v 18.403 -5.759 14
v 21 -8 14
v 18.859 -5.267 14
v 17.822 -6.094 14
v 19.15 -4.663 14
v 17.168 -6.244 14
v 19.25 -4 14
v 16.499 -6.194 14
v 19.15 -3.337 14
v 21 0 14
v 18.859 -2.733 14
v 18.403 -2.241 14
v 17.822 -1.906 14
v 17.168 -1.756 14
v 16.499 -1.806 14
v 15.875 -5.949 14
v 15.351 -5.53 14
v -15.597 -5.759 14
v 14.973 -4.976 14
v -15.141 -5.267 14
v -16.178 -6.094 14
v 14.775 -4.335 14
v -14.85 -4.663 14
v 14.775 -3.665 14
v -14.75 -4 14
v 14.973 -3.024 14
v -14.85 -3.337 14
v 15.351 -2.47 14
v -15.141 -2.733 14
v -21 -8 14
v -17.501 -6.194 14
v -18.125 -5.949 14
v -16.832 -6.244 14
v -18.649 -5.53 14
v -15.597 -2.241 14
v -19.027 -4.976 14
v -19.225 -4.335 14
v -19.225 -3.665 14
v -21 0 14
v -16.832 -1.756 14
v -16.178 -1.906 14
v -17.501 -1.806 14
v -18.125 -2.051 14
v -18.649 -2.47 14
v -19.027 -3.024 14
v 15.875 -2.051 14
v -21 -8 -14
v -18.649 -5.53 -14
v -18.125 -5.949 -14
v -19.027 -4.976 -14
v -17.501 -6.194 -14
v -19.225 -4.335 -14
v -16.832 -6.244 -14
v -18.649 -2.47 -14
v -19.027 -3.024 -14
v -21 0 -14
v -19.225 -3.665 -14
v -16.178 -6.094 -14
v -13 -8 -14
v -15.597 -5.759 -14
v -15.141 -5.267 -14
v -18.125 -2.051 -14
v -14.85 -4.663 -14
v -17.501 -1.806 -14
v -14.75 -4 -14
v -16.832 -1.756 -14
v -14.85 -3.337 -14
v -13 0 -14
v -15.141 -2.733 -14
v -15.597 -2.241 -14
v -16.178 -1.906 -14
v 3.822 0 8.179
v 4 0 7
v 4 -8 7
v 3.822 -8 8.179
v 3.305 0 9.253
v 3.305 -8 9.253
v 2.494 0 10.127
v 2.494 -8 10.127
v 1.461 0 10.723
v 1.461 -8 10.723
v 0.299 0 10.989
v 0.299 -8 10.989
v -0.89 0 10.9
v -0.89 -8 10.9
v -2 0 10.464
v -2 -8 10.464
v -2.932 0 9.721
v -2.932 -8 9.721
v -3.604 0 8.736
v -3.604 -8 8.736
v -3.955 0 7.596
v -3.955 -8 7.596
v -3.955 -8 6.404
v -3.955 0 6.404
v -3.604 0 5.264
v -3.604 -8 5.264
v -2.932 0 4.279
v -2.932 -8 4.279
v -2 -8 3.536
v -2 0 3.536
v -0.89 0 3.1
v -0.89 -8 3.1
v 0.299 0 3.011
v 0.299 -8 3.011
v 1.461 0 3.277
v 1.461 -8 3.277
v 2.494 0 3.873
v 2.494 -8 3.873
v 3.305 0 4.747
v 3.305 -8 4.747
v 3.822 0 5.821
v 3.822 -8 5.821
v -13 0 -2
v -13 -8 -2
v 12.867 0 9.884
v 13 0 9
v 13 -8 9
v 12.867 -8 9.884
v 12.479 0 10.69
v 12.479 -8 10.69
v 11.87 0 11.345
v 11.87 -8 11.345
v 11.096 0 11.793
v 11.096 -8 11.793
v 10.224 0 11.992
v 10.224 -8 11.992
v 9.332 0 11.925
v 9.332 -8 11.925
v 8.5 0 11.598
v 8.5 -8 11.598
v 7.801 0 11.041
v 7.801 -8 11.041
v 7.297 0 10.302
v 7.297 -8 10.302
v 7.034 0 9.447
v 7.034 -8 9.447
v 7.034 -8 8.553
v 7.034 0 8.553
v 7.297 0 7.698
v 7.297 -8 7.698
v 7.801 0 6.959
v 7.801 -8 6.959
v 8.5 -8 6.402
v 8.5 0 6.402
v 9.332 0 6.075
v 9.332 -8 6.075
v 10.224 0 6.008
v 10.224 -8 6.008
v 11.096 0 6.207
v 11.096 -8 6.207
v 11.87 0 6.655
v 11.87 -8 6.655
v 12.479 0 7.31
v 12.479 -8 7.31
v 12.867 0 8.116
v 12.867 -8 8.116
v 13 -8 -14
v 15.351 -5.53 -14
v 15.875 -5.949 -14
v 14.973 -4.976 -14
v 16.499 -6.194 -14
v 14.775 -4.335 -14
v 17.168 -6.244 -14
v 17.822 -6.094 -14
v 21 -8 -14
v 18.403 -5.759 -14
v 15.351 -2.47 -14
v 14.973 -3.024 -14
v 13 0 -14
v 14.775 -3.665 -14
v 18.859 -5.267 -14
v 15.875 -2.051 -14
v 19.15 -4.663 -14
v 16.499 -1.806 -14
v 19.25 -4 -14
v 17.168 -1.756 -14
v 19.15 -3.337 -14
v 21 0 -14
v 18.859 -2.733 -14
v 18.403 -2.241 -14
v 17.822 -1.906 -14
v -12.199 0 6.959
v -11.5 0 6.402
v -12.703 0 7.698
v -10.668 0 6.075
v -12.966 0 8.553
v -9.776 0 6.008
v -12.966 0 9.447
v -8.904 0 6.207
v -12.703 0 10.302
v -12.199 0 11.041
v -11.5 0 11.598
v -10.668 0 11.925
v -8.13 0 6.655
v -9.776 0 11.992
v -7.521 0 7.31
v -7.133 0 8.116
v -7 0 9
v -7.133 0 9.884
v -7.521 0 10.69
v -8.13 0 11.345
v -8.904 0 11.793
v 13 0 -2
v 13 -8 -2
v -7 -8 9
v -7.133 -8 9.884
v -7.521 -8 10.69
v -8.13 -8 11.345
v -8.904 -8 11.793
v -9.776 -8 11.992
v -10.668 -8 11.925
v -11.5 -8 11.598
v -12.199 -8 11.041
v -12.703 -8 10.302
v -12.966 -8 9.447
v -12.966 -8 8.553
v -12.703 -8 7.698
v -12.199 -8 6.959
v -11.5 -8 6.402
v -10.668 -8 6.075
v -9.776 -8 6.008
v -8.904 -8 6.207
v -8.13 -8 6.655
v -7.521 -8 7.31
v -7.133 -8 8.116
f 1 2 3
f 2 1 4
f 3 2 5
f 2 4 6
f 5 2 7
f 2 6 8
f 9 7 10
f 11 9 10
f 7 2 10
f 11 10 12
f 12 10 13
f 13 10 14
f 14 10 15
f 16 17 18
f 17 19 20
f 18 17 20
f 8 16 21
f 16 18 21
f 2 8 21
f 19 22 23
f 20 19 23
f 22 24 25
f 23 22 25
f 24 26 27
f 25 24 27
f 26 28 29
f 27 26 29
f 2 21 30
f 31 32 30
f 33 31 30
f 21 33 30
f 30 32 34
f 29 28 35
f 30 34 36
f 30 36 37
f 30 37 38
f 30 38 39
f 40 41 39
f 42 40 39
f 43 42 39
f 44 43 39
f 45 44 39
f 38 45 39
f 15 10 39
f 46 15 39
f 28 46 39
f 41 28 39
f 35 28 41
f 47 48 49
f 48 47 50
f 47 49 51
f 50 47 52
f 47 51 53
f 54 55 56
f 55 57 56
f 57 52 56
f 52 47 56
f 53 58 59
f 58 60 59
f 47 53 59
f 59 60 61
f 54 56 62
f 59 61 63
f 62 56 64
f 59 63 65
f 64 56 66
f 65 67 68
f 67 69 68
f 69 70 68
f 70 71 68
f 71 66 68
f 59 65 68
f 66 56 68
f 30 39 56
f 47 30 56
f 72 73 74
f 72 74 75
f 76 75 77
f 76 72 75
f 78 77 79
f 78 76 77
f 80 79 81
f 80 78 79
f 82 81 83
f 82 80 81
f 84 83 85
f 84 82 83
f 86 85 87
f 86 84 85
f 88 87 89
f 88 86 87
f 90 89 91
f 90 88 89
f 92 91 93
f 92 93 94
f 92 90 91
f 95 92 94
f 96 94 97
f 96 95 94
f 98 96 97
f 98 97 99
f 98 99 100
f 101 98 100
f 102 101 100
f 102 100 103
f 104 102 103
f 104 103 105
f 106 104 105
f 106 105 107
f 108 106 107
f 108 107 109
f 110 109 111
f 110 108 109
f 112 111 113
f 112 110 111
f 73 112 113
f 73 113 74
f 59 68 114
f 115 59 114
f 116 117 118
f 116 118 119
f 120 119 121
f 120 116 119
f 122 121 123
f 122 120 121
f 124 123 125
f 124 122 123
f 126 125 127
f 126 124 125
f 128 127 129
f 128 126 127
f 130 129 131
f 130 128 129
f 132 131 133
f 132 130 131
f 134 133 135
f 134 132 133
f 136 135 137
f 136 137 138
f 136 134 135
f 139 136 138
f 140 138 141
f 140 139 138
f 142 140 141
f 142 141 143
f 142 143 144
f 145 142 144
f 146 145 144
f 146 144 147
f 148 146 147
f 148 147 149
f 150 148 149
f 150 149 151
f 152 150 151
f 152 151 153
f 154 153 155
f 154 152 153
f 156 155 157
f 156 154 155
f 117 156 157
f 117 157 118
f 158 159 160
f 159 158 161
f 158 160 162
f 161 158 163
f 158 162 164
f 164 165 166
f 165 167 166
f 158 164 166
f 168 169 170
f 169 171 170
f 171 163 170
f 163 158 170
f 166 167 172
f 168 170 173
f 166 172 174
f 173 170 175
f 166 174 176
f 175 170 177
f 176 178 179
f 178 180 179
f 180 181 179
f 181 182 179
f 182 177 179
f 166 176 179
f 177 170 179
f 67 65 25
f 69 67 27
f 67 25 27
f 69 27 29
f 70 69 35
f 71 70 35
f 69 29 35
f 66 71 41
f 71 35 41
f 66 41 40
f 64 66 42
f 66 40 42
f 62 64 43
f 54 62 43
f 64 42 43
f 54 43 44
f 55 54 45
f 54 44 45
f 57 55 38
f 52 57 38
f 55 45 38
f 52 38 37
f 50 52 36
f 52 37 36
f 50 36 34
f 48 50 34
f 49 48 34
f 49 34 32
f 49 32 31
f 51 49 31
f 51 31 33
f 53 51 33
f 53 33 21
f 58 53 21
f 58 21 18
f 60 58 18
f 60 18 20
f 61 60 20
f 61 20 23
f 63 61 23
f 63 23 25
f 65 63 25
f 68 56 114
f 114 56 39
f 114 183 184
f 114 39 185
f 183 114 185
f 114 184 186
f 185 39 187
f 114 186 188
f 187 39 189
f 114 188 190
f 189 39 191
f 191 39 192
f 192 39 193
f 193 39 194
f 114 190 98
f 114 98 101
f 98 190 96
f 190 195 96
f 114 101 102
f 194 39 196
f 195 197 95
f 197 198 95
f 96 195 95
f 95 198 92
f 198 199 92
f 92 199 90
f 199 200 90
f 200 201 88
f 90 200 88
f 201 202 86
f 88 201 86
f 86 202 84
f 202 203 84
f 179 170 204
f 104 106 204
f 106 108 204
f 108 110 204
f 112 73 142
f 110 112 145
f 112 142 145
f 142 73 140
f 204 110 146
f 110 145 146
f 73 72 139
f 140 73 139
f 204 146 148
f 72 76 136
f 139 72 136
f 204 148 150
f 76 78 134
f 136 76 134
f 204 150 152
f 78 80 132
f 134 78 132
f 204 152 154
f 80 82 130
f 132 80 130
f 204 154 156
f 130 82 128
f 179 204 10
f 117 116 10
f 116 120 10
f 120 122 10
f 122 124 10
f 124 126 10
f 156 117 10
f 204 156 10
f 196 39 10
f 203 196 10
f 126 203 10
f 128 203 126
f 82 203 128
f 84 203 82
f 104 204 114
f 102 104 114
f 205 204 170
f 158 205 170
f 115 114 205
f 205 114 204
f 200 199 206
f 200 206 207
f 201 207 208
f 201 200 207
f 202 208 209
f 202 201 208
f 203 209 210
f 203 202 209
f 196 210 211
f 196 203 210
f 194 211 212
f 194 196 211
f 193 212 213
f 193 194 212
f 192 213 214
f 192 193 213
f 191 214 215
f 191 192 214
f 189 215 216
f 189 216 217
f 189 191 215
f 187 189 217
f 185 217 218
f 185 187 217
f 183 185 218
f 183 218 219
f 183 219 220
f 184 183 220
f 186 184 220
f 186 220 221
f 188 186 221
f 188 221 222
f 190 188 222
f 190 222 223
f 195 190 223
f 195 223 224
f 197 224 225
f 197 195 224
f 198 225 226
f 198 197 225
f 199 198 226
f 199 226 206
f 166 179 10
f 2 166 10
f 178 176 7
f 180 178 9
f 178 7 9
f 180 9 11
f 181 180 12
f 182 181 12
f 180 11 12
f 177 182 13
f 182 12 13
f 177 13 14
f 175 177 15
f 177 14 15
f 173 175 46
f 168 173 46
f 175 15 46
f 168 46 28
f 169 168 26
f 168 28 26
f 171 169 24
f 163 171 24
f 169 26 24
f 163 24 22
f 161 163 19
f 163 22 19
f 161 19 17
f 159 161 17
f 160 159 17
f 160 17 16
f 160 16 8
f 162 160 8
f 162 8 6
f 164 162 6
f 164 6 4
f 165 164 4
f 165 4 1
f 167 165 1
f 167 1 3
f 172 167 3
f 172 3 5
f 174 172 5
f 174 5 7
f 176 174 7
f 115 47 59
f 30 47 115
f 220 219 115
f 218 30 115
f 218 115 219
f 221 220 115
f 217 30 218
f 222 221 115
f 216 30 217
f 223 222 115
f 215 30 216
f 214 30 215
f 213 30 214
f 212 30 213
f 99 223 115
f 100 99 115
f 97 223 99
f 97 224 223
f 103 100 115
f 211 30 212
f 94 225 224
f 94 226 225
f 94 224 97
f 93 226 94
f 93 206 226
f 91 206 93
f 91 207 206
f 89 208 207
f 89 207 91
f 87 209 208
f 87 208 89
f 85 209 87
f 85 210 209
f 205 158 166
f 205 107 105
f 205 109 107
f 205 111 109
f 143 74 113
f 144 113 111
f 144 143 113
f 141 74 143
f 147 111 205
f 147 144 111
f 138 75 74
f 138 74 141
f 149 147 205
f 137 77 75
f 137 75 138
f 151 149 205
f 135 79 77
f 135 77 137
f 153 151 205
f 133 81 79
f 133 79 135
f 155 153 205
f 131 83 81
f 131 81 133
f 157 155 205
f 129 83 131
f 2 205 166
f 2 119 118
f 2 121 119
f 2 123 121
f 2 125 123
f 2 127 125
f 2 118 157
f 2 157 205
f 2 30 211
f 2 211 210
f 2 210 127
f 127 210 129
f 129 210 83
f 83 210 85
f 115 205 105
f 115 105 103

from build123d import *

# Parameters (mm, degrees)
F0_R     = 3
F0_R_2   = 4
F1_DEPTH = 8
F2_R     = 2.25
F3_DEPTH = 28.001


with BuildPart() as f1:
    # F0 (on Front) → F1 (new body)
    with BuildSketch(Plane.XZ):
        Polygon((21, 14), (-21, 14), (-21, -14), (-13, -14), (-13, -2), (13, -2), (13, -14), (21, -14), align=None)
        with Locations((-10, 9)):
            Circle(F0_R, mode=Mode.SUBTRACT)
        with Locations((0, 7)):
            Circle(F0_R_2, mode=Mode.SUBTRACT)
        with Locations((10, 9)):
            Circle(F0_R, mode=Mode.SUBTRACT)
    extrude(amount=F1_DEPTH)

    # F2 (on face) → F3 (cut, through all)
    with BuildSketch(Plane.XY.offset(14)):
        with Locations((-17, -4)):
            Circle(F2_R)
        with Locations((17, -4)):
            Circle(F2_R)
    extrude(amount=-F3_DEPTH, mode=Mode.SUBTRACT)


solid = f1.part
